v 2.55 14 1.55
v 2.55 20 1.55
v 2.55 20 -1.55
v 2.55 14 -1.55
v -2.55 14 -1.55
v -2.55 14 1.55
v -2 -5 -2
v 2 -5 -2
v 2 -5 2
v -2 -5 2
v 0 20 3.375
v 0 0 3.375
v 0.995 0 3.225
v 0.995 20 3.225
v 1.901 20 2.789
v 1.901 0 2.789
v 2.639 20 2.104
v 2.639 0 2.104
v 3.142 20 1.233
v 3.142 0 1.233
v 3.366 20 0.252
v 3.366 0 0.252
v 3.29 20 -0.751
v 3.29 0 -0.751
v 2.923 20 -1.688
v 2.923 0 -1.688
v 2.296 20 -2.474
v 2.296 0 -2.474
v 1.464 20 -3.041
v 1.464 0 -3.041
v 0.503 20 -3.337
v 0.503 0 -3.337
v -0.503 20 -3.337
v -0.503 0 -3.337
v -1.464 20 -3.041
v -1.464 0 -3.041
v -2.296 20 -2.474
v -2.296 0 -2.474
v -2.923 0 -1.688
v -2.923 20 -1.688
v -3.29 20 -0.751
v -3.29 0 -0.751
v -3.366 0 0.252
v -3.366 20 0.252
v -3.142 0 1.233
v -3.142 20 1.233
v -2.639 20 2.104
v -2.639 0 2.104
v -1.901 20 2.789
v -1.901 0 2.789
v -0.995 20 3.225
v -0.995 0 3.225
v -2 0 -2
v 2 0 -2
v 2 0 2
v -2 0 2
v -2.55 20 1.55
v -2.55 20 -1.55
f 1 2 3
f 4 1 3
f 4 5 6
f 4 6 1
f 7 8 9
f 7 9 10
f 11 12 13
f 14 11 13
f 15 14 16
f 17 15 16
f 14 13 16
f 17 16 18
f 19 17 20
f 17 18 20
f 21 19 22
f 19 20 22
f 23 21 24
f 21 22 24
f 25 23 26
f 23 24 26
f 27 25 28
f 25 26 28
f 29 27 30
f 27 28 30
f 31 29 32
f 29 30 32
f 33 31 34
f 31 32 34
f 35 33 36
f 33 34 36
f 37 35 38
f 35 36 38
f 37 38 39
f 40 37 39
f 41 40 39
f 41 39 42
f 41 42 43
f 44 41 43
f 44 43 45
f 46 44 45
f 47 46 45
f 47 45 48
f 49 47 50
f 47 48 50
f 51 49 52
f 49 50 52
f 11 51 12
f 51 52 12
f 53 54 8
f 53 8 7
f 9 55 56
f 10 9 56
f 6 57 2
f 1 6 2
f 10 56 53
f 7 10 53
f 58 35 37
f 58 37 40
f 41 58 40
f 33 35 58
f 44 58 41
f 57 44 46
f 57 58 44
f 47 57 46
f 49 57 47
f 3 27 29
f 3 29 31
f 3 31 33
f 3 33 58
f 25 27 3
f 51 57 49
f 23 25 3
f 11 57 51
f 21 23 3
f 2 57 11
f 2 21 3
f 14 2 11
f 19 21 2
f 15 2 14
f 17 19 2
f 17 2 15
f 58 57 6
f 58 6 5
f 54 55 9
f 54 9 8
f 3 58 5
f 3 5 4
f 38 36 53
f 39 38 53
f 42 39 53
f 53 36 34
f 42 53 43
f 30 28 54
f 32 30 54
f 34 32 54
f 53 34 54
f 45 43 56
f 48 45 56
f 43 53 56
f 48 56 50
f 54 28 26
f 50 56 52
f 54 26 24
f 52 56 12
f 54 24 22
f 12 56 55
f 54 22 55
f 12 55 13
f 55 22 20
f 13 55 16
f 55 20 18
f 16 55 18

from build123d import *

# Parameters (mm, degrees)
SKETCH1_R           = 3.375
BOSS_EXTRUDE1_DEPTH = 20
SKETCH3_W           = 5.1
SKETCH3_H           = 3.1
CUT_EXTRUDE2_DEPTH  = 6
SKETCH2_W           = 4
SKETCH2_H           = 4
BOSS_EXTRUDE2_DEPTH = 5


with BuildPart() as part:
    # Sketch1 → Boss-Extrude1 (new body)
    with BuildSketch(Plane(origin=(0, 0, 0), x_dir=(1, 0, 0), z_dir=(0, 1, 0))):
        with Locations(Location((0, 0, 0), (0, 0, 270))):
            Circle(SKETCH1_R)
    extrude(amount=BOSS_EXTRUDE1_DEPTH)

    # Sketch3 → Cut-Extrude2 (cut)
    with BuildSketch(Plane(origin=(0, 20, 0), x_dir=(1, 0, 0), z_dir=(0, 1, 0))):
        Rectangle(SKETCH3_W, SKETCH3_H)
    extrude(amount=-CUT_EXTRUDE2_DEPTH, mode=Mode.SUBTRACT)

    # Sketch2 → Boss-Extrude2 (add)
    with BuildSketch(Plane(origin=(0, 0, 0), x_dir=(-1, 0, 0), z_dir=(0, -1, 0))):
        Rectangle(SKETCH2_W, SKETCH2_H)
    extrude(amount=BOSS_EXTRUDE2_DEPTH)


solid = part.part
